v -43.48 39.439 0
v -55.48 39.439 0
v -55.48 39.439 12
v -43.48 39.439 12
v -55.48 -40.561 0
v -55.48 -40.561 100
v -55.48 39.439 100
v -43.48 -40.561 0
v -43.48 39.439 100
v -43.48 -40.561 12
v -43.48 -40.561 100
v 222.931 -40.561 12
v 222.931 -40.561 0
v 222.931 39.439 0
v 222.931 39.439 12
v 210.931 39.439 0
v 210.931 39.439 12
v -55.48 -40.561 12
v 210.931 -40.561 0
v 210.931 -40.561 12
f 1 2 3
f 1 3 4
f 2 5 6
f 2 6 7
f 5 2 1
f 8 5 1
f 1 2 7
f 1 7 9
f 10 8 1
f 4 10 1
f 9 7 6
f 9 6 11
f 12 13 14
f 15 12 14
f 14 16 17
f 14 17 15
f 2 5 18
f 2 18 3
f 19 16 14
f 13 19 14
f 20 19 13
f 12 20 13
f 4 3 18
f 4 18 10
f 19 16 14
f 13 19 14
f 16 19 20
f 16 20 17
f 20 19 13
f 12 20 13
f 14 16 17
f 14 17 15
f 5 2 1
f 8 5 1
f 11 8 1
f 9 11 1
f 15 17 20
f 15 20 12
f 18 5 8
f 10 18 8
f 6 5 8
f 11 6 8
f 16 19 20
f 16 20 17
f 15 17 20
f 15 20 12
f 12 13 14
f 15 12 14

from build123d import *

# Parameters (mm, degrees)
F0_W     = 12
F0_H     = 80
F1_DEPTH = 100
F2_DEPTH = 12
F3_DEPTH = 12


# Not quite as in the source:
# - a feature names something its author has since deleted; it is built from what else it names


with BuildPart() as f1:
    # F0 (on Top) → F1 (new body)
    with BuildSketch(Plane.XY):
        with Locations((-49.4798701257, -0.5611437102)):
            Rectangle(F0_W, F0_H)
    extrude(amount=F1_DEPTH)

    # F0 (on Top) → F2 (join)
    with BuildSketch(Plane.XY):
        with Locations((-49.4798701257, -0.5611437102)):
            Rectangle(F0_W, F0_H)
    extrude(amount=F2_DEPTH)


with BuildPart() as f2:
    # F0 (on Top) → F2, piece 2 (new body)
    with BuildSketch(Plane.XY):
        with Locations((216.9306901693, -0.5611433089)):
            Rectangle(F0_W, F0_H)
    extrude(amount=F2_DEPTH)


with BuildPart() as f3:
    # F0 (on Top) → F3 (new body)
    with BuildSketch(Plane.XY):
        with Locations((-49.4798701257, -0.5611437102)):
            Rectangle(F0_W, F0_H)
    extrude(amount=F3_DEPTH)


with BuildPart() as f3b:
    # F0 (on Top) → F3, piece 2 (new body)
    with BuildSketch(Plane.XY):
        with Locations((216.9306901693, -0.5611433089)):
            Rectangle(F0_W, F0_H)
    extrude(amount=F3_DEPTH)


solid = Compound([f1.part, f2.part, f3.part, f3b.part])
